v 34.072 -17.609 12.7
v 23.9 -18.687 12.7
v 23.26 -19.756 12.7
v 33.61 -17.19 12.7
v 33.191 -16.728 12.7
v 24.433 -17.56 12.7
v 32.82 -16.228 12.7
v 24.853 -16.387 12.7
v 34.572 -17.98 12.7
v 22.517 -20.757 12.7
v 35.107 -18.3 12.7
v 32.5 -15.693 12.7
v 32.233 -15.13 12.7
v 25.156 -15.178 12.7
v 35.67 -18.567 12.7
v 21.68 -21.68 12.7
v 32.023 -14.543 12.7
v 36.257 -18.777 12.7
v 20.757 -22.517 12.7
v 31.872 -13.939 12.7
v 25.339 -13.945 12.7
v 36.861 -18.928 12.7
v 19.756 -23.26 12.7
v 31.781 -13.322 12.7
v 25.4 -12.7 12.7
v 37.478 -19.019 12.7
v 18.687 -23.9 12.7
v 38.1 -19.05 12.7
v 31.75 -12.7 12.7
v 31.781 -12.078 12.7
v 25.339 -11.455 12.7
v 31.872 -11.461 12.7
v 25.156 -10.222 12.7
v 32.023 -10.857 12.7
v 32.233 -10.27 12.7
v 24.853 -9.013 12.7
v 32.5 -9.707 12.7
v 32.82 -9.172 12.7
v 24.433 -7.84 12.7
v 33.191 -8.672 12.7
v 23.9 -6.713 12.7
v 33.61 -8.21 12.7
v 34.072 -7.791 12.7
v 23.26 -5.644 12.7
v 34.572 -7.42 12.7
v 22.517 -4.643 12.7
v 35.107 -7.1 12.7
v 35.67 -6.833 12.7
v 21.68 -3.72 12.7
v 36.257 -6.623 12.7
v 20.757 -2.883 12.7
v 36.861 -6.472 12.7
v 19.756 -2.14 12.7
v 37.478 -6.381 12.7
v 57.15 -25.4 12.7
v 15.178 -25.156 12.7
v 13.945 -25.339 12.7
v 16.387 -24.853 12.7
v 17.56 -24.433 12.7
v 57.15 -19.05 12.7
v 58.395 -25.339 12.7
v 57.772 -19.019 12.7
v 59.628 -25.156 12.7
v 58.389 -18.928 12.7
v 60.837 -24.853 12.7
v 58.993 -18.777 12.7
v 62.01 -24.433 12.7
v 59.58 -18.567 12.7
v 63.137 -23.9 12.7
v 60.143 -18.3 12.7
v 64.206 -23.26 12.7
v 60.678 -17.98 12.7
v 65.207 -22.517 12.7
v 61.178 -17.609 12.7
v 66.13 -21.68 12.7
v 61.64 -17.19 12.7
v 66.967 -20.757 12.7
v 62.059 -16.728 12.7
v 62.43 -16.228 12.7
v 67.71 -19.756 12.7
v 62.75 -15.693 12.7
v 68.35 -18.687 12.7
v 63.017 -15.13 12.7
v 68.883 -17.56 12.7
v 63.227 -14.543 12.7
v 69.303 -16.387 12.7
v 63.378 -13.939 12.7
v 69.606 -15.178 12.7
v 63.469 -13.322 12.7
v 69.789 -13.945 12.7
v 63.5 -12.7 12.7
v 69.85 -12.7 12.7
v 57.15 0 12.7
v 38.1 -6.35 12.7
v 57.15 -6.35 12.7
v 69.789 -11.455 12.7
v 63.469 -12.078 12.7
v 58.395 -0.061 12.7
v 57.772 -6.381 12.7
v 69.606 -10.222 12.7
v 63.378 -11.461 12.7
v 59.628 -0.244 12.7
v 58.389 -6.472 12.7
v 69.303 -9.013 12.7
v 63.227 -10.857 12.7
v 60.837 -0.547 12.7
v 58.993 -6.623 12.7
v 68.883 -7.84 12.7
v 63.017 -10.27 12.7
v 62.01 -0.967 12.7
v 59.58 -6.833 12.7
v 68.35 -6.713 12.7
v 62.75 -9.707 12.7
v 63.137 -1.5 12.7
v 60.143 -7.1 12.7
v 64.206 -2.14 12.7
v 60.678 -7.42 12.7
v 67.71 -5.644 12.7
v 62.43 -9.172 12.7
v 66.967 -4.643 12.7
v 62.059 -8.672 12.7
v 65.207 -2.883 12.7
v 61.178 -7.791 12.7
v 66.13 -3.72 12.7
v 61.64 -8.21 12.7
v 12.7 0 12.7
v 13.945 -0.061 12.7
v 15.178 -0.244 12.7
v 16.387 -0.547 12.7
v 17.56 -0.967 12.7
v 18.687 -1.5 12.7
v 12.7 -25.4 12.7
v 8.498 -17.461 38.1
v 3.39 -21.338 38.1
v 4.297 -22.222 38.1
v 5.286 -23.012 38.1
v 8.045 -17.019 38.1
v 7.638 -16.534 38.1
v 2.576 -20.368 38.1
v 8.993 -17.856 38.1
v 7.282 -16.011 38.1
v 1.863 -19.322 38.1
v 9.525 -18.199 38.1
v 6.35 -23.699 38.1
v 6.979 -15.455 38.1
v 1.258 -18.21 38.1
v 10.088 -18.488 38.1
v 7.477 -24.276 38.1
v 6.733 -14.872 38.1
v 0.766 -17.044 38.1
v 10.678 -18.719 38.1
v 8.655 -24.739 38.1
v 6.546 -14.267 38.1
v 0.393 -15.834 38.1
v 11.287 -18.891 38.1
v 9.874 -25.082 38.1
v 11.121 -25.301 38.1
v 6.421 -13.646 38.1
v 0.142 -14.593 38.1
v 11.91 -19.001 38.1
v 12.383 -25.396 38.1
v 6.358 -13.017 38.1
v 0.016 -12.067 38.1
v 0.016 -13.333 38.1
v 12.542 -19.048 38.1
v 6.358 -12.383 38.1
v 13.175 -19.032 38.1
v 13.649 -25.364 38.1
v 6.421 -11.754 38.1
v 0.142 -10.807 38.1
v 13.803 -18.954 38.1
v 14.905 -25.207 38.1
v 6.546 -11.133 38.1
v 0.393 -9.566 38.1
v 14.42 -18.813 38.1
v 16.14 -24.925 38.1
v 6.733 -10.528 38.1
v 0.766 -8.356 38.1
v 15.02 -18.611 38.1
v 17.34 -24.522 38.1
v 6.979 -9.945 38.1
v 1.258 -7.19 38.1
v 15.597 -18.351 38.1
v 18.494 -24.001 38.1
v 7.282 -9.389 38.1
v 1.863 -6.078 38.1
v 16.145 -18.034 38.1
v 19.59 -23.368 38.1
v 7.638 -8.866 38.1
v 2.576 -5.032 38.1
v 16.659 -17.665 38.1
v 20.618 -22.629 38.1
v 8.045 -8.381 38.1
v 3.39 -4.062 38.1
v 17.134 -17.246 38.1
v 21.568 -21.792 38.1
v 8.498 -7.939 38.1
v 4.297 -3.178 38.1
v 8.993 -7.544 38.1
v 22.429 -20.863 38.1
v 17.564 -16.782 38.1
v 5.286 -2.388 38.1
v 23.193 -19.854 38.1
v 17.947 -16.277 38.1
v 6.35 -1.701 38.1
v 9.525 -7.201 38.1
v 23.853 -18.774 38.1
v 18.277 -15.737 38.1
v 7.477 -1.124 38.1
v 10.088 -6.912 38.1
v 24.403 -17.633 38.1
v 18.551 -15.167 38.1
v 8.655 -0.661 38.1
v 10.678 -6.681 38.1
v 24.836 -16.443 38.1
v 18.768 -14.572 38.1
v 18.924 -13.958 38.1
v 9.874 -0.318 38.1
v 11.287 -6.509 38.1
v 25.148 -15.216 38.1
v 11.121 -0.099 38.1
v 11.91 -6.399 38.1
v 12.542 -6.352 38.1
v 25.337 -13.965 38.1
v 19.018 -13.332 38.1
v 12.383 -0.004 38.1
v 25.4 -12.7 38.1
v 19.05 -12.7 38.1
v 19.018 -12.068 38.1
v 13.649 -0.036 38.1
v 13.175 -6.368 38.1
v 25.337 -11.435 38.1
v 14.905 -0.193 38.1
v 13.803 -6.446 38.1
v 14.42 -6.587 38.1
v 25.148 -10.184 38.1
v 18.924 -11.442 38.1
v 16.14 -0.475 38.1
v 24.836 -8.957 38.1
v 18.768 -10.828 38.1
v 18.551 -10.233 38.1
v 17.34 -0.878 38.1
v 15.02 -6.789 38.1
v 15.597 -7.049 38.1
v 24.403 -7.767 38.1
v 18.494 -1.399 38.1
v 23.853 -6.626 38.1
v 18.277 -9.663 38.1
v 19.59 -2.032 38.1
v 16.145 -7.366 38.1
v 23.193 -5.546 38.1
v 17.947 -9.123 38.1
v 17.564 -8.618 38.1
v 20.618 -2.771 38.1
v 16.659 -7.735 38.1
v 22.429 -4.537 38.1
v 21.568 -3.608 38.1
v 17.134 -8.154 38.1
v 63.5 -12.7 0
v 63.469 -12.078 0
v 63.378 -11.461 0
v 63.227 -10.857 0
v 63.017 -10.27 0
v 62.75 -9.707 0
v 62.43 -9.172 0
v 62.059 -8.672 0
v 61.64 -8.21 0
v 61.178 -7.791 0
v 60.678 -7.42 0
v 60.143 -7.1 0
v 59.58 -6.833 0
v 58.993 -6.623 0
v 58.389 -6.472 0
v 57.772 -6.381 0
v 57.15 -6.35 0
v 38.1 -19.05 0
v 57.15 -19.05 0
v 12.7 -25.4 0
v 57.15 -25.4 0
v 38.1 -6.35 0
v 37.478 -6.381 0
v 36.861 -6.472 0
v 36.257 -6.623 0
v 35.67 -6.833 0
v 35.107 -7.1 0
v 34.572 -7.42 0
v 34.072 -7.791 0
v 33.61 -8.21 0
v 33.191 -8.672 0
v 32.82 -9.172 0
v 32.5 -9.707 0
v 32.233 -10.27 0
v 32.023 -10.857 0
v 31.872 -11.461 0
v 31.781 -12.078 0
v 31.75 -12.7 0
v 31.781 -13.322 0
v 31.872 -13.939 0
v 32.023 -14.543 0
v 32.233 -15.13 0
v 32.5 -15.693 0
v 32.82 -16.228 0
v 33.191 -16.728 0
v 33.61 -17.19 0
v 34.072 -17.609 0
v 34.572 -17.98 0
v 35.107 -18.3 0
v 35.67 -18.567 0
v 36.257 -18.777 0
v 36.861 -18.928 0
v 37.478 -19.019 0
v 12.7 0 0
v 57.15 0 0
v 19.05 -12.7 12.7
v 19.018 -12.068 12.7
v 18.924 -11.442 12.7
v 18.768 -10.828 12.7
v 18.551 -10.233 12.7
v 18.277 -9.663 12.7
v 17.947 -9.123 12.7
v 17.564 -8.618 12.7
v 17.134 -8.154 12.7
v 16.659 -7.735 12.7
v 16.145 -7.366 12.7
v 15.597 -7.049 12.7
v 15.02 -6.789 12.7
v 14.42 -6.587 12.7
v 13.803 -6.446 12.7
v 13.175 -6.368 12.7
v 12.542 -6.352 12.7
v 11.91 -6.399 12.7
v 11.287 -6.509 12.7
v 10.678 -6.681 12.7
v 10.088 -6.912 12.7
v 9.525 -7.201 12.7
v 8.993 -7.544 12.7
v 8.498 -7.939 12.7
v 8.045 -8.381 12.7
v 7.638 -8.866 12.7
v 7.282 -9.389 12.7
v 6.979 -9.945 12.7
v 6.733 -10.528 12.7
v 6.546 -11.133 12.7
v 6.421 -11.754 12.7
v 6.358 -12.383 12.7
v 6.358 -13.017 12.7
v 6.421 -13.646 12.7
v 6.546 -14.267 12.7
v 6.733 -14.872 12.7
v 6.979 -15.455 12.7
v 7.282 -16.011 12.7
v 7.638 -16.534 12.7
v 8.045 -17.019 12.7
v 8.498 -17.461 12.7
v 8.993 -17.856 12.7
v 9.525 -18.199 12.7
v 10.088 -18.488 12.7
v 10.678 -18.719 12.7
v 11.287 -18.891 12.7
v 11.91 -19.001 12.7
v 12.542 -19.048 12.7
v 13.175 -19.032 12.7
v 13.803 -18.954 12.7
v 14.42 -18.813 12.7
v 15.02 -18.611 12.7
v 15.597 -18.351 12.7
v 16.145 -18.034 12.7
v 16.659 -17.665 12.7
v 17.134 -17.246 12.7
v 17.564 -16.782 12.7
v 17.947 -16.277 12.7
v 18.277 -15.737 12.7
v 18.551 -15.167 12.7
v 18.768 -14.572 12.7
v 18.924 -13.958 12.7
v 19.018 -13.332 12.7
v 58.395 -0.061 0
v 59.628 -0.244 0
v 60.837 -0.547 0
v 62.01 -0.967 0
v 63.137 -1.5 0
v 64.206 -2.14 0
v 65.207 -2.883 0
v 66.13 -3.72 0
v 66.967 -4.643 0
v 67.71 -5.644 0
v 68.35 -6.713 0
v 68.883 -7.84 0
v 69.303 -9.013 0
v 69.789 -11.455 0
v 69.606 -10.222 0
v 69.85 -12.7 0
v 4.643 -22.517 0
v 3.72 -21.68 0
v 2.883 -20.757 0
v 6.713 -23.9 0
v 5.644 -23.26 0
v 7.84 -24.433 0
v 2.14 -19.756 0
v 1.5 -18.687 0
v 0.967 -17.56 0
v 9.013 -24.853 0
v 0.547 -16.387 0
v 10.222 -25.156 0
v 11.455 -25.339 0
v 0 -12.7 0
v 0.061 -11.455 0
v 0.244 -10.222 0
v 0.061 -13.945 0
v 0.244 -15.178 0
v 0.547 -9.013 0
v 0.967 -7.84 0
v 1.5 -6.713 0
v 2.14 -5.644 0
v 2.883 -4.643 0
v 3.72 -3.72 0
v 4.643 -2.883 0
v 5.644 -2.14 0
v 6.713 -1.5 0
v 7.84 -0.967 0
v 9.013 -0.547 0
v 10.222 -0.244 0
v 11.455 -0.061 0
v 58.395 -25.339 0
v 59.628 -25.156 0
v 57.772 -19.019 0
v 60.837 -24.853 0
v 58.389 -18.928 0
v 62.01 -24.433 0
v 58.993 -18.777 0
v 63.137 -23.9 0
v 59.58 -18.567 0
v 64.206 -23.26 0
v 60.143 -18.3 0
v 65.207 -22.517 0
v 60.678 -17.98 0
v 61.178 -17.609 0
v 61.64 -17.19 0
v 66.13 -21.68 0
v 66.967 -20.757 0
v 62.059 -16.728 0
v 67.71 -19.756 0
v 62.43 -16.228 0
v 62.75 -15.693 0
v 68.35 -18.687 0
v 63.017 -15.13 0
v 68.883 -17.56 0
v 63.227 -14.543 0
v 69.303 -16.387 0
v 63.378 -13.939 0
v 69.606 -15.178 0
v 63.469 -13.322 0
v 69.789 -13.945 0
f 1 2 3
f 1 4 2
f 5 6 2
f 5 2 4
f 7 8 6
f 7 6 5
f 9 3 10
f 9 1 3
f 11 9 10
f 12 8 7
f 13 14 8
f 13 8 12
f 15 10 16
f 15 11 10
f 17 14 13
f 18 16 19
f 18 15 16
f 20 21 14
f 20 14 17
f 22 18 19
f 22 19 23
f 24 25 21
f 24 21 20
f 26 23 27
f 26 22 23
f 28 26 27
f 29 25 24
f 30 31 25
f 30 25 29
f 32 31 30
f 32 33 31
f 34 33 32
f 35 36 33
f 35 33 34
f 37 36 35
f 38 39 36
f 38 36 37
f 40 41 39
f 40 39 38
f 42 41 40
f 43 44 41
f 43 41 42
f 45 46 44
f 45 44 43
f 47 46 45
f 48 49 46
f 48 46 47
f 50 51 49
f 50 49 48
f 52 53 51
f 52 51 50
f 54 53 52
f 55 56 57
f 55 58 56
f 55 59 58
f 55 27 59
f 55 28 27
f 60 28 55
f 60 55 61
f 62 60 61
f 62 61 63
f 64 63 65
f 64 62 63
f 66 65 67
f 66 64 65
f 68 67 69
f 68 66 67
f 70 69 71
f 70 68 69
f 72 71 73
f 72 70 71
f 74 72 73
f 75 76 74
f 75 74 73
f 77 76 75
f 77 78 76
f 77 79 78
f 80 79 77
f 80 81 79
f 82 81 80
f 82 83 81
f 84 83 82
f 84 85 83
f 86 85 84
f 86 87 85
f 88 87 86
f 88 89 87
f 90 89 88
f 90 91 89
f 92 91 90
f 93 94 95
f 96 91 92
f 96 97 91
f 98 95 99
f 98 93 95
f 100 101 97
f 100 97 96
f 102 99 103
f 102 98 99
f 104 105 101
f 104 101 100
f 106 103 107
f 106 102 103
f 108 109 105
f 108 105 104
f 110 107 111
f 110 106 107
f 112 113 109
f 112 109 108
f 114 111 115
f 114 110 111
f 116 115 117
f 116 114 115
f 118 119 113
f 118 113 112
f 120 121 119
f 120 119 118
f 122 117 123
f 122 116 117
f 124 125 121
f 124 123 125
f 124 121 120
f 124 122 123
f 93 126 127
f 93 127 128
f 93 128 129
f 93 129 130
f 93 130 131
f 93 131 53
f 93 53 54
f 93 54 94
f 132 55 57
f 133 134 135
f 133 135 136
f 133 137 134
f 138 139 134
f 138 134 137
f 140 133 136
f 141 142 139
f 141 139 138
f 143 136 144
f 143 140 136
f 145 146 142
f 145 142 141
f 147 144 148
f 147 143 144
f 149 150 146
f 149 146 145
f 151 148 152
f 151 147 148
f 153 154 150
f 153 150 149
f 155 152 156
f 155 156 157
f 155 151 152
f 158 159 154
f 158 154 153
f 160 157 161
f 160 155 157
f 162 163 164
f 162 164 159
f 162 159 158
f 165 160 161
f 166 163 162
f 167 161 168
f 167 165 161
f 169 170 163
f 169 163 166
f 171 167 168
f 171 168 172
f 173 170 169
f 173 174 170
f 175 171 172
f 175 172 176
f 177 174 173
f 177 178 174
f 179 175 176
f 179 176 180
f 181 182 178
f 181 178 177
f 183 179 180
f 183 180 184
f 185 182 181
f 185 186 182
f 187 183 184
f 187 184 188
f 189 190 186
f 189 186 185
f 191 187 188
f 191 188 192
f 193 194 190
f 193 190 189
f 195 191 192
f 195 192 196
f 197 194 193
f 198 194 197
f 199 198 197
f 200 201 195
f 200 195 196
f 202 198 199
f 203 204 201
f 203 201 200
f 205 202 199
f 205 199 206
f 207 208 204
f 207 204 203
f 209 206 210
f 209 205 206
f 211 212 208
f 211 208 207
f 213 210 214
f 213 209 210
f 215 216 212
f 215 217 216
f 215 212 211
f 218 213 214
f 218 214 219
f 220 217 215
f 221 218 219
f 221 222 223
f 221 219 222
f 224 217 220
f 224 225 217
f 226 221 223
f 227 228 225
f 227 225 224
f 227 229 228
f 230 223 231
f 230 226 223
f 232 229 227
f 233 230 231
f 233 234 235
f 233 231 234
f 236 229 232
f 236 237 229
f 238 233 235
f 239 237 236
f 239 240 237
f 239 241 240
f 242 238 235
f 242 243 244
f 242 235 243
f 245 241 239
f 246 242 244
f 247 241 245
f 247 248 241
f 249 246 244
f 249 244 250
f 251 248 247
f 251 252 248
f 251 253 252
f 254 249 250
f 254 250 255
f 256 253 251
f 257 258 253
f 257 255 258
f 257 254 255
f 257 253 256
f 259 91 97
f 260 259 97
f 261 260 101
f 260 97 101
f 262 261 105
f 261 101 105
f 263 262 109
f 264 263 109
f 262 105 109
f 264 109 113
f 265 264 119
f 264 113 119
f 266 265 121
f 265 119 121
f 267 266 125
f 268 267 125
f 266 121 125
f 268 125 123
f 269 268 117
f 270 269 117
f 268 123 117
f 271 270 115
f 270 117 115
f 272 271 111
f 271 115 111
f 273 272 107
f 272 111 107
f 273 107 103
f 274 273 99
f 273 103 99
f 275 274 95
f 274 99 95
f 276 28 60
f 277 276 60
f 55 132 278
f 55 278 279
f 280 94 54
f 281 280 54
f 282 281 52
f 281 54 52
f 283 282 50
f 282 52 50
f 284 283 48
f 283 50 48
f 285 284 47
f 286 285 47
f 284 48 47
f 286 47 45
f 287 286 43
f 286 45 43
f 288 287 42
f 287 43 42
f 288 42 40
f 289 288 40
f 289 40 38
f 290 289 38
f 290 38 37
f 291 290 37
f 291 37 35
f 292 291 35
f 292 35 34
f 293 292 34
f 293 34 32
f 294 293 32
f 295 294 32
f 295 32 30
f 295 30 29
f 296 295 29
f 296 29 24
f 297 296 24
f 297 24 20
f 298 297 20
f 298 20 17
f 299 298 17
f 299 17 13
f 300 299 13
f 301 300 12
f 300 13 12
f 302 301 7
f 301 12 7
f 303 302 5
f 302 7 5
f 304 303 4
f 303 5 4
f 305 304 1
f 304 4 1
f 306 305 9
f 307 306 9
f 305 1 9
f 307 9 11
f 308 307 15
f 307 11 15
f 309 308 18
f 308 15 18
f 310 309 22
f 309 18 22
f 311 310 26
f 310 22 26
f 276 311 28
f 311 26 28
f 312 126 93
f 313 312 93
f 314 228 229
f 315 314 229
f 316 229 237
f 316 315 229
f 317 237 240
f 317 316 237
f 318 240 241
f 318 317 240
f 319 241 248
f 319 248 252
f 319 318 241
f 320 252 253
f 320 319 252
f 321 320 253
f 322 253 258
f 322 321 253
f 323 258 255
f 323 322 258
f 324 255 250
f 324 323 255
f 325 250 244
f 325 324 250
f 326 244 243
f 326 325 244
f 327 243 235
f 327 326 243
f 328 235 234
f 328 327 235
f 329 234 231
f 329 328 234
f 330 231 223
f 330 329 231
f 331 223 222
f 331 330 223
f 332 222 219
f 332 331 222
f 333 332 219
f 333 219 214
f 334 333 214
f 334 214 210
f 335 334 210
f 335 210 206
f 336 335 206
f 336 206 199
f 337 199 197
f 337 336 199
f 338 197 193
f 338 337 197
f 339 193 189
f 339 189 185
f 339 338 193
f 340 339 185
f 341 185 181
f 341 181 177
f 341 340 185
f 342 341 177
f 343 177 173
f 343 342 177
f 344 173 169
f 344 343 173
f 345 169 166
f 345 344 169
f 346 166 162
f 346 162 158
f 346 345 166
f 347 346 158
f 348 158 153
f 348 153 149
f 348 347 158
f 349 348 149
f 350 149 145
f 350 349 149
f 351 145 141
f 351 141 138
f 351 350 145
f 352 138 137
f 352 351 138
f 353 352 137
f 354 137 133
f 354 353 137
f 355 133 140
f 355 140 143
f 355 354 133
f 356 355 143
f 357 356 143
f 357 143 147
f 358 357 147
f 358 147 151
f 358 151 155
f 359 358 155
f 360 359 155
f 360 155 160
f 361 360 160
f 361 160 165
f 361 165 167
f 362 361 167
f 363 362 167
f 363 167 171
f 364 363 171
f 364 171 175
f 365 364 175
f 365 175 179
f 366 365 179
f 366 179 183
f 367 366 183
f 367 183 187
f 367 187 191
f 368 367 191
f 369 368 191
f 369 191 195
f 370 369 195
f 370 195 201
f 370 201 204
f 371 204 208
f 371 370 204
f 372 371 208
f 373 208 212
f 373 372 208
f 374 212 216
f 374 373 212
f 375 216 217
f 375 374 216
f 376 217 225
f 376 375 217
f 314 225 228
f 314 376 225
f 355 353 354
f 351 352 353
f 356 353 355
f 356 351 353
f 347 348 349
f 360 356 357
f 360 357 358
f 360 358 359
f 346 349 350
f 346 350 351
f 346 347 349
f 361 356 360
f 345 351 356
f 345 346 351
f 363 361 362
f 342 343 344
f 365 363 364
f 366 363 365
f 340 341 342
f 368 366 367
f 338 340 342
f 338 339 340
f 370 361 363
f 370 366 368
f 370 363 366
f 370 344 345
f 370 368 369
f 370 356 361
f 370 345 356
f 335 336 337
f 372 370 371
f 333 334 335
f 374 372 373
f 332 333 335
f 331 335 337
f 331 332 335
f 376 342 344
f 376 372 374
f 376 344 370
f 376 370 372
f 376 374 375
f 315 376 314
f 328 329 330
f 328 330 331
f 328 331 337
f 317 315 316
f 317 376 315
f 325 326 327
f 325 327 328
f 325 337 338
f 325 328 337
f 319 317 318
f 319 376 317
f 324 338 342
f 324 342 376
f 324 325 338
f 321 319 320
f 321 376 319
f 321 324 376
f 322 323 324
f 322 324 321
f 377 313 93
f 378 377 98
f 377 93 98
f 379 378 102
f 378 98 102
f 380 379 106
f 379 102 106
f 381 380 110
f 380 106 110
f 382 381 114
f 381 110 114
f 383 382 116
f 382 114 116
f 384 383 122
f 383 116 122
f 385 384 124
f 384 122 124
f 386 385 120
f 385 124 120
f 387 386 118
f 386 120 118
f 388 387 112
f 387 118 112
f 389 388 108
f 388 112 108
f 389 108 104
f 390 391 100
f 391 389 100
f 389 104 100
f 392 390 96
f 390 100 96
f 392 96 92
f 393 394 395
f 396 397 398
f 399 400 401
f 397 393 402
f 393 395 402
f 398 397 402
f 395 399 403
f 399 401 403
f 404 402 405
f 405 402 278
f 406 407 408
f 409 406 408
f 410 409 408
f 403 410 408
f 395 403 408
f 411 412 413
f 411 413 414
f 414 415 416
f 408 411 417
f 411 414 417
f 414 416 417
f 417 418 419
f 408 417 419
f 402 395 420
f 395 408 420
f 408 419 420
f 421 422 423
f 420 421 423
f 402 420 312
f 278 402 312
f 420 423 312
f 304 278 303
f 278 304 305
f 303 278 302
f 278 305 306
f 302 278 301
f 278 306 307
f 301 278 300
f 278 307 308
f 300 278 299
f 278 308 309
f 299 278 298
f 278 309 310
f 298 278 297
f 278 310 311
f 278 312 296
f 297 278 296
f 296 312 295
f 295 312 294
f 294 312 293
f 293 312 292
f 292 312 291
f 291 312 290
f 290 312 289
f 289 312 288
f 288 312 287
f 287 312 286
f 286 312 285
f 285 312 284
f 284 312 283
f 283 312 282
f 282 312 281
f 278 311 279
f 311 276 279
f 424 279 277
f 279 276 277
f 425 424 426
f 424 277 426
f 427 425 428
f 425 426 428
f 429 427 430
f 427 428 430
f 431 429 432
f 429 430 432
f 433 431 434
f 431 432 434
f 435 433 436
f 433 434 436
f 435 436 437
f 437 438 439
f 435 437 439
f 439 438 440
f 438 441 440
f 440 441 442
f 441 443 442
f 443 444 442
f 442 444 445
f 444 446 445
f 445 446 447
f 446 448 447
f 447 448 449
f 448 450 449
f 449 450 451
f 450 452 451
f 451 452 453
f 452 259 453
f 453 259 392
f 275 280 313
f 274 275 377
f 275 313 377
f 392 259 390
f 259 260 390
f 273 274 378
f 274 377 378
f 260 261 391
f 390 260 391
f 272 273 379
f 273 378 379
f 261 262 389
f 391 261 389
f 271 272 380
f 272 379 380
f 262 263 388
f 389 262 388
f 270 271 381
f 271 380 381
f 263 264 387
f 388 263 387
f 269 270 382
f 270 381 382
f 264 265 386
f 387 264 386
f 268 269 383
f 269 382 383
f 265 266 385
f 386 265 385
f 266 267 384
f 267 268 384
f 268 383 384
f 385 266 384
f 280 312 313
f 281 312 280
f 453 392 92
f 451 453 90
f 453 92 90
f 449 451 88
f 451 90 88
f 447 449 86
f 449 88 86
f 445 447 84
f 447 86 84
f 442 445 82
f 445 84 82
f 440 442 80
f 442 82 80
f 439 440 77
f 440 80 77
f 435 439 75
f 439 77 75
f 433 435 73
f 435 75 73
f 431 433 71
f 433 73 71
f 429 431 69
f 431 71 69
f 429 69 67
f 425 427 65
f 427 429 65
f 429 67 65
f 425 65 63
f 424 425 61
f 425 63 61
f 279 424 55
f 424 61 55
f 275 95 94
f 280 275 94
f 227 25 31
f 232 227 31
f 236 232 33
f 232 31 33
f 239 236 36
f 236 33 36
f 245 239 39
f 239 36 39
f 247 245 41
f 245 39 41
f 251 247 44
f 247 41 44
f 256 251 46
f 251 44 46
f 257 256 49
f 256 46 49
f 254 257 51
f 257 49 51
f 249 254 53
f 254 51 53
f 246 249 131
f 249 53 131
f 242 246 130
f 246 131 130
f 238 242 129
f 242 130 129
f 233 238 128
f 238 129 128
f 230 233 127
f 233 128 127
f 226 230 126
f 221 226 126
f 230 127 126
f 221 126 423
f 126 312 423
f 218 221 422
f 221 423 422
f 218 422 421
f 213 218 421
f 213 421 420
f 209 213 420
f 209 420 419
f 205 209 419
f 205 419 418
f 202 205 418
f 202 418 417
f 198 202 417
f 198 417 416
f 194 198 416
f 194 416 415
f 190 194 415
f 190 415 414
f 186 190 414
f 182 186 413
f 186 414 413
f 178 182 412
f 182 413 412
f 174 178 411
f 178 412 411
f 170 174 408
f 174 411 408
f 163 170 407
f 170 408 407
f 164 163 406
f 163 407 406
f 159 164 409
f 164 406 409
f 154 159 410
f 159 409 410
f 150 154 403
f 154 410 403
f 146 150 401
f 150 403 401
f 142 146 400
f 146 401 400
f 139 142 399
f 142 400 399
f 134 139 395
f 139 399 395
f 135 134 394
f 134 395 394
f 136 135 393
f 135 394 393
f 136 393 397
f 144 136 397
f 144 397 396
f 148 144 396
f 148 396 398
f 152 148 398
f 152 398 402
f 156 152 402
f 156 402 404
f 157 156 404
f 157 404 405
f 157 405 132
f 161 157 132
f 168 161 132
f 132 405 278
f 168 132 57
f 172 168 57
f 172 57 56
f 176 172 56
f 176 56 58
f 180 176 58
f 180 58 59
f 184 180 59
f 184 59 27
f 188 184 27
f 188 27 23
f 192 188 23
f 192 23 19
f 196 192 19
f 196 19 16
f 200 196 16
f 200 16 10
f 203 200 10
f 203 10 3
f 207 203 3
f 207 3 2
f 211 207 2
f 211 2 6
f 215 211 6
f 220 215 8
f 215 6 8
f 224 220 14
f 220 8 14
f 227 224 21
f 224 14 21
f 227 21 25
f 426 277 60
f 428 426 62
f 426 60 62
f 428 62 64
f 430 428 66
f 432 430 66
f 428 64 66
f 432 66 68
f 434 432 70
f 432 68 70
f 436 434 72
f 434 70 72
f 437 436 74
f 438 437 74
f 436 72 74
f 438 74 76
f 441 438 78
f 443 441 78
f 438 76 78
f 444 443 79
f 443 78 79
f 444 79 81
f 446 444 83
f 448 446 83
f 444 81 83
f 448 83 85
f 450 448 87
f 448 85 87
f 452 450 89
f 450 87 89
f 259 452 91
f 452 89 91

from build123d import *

# Parameters (mm, degrees)
F0_W     = 69.85
F0_H     = 12.7
F1_DEPTH = 25.4
F2_R     = 12.7
F2_R_2   = 6.35
F3_DEPTH = 25.4
F4_DEPTH = 25.4
F6_DEPTH = 25.4


with BuildPart() as f1:
    # F0 (on Front) → F1 (new body)
    with BuildSketch(Plane.XZ):
        with Locations((34.925, 6.35)):
            Rectangle(F0_W, F0_H)
    extrude(amount=F1_DEPTH)

    # F2 (on face) → F3 (join)
    with BuildSketch(Plane.XY.offset(12.7)):
        with Locations((12.7, -12.7)):
            Circle(F2_R)
        with Locations((12.7, -12.7)):
            Circle(F2_R_2, mode=Mode.SUBTRACT)
    extrude(amount=F3_DEPTH)

    # F4 (cut): faces of the model
    f4_faces = [f1.faces().sort_by_distance(p)[0] for p in [
        (2.8367728246, -22.5632271754, 12.7),
        (2.8367728246, -2.8367728246, 12.7),
    ]]
    extrude(f4_faces, amount=-F4_DEPTH, mode=Mode.SUBTRACT)

    # F5 (on face) → F6 (cut)
    with BuildSketch(Plane.XY.offset(12.7)):
        with BuildLine():
            ThreePointArc((38.1, -19.05), (42.5901280605, -17.1901280605), (44.45, -12.7))
            ThreePointArc((44.45, -12.7), (42.5901280605, -8.2098719395), (38.1, -6.35))
            ThreePointArc((38.1, -6.35), (31.75, -12.7), (38.1, -19.05))
        make_face()
        with BuildLine():
            ThreePointArc((38.1, -6.35), (42.5901280605, -8.2098719395), (44.45, -12.7))
            ThreePointArc((44.45, -12.7), (42.5901280605, -17.1901280605), (38.1, -19.05))
            Line((38.1, -19.05), (57.15, -19.05))
            ThreePointArc((57.15, -19.05), (50.8, -12.7), (57.15, -6.35))
            Line((57.15, -6.35), (38.1, -6.35))
        make_face()
        with BuildLine():
            ThreePointArc((63.5, -12.7), (61.6401280605, -8.2098719395), (57.15, -6.35))
            ThreePointArc((57.15, -6.35), (50.8, -12.7), (57.15, -19.05))
            ThreePointArc((57.15, -19.05), (61.6401280605, -17.1901280605), (63.5, -12.7))
        make_face()
        with BuildLine():
            ThreePointArc((57.15, 0), (66.1302561211, -3.7197438789), (69.85, -12.7))
            Line((69.85, -12.7), (69.85, 0))
            Line((69.85, 0), (57.15, 0))
        make_face()
        with BuildLine():
            ThreePointArc((69.85, -12.7), (66.1302561211, -21.6802561211), (57.15, -25.4))
            Line((57.15, -25.4), (69.85, -25.4))
            Line((69.85, -25.4), (69.85, -12.7))
        make_face()
    extrude(amount=-F6_DEPTH, mode=Mode.SUBTRACT)


solid = f1.part
